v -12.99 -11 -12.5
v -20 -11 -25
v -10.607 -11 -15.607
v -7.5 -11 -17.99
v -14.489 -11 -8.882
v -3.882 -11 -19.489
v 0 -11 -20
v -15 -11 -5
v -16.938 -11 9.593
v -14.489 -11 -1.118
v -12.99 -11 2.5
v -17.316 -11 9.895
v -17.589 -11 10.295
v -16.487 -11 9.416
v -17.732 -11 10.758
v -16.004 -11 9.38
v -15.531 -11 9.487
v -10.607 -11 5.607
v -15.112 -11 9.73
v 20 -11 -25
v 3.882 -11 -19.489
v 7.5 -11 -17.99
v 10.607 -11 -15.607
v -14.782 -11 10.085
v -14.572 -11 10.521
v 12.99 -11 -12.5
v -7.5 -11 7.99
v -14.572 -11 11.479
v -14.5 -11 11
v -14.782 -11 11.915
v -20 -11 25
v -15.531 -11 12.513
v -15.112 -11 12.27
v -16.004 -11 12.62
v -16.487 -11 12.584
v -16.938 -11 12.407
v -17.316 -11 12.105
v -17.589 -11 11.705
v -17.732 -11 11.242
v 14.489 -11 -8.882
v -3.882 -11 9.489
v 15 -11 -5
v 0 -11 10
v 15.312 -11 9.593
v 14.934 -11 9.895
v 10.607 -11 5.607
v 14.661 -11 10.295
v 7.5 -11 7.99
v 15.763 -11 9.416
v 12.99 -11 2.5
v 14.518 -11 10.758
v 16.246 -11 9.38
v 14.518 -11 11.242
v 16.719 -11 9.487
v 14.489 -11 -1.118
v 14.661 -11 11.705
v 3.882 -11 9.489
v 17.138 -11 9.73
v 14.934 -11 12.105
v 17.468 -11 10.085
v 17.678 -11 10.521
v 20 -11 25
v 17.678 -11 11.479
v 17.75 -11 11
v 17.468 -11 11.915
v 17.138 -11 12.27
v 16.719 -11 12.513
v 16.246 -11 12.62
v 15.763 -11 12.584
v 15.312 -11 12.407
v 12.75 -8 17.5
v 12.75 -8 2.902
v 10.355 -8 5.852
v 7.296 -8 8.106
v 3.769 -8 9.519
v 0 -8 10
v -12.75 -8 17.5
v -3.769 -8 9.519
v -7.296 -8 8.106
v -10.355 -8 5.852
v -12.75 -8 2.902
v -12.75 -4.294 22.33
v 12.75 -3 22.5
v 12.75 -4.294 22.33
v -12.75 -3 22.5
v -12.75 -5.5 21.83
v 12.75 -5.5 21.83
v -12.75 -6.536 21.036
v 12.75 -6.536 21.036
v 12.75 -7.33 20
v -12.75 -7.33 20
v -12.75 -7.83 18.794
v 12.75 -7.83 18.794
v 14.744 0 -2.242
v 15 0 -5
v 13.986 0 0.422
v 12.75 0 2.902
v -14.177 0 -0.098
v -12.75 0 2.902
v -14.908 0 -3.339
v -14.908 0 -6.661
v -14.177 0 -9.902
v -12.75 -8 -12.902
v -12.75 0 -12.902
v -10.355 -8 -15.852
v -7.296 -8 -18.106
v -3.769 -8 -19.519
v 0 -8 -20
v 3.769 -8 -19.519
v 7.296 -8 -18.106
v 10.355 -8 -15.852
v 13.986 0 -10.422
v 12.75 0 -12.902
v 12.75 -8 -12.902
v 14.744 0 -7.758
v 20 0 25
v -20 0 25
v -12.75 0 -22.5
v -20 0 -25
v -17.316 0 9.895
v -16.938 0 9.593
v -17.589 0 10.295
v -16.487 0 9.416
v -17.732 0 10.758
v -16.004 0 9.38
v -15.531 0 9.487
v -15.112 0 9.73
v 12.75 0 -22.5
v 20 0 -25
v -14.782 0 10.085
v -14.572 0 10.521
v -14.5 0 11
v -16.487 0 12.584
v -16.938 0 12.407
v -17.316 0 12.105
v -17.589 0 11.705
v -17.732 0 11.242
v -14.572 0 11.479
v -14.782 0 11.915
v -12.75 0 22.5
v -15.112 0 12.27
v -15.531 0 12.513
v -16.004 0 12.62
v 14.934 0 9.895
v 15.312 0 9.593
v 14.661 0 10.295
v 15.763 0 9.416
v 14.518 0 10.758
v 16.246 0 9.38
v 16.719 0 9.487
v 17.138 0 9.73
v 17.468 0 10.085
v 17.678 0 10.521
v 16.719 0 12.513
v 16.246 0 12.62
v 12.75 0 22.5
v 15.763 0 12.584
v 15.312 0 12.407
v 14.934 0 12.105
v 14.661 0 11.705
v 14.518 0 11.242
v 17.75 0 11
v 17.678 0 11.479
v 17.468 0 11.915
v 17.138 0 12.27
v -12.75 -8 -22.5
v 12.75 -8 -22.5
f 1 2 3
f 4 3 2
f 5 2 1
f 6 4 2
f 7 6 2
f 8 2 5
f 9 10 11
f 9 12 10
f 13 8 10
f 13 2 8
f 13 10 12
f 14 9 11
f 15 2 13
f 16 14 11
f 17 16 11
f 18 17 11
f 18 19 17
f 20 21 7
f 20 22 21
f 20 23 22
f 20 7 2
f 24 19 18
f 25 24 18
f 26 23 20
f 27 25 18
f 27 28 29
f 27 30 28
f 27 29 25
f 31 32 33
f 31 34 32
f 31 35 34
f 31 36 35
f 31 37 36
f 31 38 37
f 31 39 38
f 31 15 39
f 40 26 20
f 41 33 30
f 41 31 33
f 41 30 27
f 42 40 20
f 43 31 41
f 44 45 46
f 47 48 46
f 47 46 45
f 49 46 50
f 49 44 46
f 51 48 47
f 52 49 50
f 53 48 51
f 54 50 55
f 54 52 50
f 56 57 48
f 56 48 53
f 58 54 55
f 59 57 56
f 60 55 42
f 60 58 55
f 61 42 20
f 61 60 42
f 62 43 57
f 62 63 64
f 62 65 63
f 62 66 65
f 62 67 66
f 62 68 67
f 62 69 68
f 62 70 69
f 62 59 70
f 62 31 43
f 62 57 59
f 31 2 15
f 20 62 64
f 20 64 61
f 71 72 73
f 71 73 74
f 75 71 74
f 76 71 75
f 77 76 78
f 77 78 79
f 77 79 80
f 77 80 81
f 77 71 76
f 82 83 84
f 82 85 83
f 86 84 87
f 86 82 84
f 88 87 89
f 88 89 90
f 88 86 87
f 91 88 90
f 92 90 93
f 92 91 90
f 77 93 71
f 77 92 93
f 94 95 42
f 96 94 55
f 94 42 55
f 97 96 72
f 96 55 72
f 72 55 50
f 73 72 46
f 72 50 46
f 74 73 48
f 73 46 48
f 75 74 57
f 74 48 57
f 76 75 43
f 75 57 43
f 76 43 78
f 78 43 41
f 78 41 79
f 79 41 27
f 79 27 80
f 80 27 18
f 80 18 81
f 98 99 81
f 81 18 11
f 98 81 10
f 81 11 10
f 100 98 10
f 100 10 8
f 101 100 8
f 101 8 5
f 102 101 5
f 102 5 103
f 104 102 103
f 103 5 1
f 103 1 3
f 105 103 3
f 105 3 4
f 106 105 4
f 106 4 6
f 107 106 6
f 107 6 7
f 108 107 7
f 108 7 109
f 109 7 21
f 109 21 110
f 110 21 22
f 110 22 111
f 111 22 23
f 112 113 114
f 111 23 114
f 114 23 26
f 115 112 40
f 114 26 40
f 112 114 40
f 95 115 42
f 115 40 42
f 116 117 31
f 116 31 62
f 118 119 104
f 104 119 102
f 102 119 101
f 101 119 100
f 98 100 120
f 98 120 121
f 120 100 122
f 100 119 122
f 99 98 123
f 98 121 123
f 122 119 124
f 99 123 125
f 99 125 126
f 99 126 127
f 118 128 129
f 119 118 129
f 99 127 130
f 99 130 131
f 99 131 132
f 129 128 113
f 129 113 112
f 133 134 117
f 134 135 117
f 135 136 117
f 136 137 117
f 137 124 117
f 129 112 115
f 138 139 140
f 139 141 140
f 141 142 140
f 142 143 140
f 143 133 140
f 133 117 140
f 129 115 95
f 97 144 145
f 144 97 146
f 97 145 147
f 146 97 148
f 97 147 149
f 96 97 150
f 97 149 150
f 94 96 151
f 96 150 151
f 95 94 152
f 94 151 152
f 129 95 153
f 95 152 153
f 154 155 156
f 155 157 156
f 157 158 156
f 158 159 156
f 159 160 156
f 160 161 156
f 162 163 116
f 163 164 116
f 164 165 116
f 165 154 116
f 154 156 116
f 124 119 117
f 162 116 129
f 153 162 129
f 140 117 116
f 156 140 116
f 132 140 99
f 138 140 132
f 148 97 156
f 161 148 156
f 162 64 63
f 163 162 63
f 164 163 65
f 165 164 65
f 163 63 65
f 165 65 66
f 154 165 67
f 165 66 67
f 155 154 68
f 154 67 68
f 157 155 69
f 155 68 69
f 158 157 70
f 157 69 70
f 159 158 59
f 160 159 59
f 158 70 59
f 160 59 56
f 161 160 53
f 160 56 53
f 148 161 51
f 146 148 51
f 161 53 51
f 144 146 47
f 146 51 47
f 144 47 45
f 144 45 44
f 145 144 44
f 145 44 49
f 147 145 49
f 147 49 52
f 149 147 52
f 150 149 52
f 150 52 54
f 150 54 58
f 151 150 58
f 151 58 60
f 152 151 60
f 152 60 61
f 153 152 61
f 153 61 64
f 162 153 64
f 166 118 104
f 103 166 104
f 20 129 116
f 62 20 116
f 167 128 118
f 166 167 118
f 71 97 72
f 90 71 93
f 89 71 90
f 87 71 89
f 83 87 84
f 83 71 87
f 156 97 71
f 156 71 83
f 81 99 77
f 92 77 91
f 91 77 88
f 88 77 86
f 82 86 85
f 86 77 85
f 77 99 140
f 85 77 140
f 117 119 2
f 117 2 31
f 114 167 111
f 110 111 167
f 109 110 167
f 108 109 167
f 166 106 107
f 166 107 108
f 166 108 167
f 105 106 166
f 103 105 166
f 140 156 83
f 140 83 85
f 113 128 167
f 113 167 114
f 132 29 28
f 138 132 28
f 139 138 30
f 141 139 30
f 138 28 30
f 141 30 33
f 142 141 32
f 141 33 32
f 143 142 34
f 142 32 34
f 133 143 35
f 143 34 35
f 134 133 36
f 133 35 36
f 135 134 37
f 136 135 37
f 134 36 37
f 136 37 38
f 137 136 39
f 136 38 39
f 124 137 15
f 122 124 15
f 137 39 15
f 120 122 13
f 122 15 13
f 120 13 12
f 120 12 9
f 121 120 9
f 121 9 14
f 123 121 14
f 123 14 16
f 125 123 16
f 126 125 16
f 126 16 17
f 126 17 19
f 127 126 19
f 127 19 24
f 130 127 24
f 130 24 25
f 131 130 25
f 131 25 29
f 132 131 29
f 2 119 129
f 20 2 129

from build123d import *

# Parameters (mm, degrees)
F0_W     = 40
F0_H     = 50
F1_DEPTH = 11
F2_R     = 1.625
F3_DEPTH = 11.001
F4_W     = 25.5
F4_H     = 45
F5_DEPTH = 8
F6_R     = 5
F7_R     = 15
F8_DEPTH = 25


with BuildPart() as f1:
    # F0 (on Front) → F1 (new body)
    with BuildSketch(Plane.XZ):
        Rectangle(F0_W, F0_H)
    extrude(amount=F1_DEPTH)

    # F2 (on face) → F3 (cut, through all)
    with BuildSketch(Plane.XZ.offset(11)):
        with Locations((-16.125, 11)):
            Circle(F2_R)
        with Locations((16.125, 11)):
            Circle(F2_R)
    extrude(amount=-F3_DEPTH, mode=Mode.SUBTRACT)

    # F4 (on face) → F5 (cut)
    with BuildSketch(Plane(origin=(0, 0, 0), x_dir=(-1, 0, 0), z_dir=(0, 1, 0))):
        Rectangle(F4_W, F4_H)
    extrude(amount=-F5_DEPTH, mode=Mode.SUBTRACT)

    # F6
    f6_edges = [f1.edges().sort_by_distance(p)[0] for p in [
        (0, -8, 22.5),
    ]]
    fillet(f6_edges, radius=F6_R)

    # F7 (on face) → F8 (cut)
    with BuildSketch(Plane.XZ.offset(11)):
        with Locations((0, -5)):
            Circle(F7_R)
    extrude(amount=-F8_DEPTH, mode=Mode.SUBTRACT)


solid = f1.part
